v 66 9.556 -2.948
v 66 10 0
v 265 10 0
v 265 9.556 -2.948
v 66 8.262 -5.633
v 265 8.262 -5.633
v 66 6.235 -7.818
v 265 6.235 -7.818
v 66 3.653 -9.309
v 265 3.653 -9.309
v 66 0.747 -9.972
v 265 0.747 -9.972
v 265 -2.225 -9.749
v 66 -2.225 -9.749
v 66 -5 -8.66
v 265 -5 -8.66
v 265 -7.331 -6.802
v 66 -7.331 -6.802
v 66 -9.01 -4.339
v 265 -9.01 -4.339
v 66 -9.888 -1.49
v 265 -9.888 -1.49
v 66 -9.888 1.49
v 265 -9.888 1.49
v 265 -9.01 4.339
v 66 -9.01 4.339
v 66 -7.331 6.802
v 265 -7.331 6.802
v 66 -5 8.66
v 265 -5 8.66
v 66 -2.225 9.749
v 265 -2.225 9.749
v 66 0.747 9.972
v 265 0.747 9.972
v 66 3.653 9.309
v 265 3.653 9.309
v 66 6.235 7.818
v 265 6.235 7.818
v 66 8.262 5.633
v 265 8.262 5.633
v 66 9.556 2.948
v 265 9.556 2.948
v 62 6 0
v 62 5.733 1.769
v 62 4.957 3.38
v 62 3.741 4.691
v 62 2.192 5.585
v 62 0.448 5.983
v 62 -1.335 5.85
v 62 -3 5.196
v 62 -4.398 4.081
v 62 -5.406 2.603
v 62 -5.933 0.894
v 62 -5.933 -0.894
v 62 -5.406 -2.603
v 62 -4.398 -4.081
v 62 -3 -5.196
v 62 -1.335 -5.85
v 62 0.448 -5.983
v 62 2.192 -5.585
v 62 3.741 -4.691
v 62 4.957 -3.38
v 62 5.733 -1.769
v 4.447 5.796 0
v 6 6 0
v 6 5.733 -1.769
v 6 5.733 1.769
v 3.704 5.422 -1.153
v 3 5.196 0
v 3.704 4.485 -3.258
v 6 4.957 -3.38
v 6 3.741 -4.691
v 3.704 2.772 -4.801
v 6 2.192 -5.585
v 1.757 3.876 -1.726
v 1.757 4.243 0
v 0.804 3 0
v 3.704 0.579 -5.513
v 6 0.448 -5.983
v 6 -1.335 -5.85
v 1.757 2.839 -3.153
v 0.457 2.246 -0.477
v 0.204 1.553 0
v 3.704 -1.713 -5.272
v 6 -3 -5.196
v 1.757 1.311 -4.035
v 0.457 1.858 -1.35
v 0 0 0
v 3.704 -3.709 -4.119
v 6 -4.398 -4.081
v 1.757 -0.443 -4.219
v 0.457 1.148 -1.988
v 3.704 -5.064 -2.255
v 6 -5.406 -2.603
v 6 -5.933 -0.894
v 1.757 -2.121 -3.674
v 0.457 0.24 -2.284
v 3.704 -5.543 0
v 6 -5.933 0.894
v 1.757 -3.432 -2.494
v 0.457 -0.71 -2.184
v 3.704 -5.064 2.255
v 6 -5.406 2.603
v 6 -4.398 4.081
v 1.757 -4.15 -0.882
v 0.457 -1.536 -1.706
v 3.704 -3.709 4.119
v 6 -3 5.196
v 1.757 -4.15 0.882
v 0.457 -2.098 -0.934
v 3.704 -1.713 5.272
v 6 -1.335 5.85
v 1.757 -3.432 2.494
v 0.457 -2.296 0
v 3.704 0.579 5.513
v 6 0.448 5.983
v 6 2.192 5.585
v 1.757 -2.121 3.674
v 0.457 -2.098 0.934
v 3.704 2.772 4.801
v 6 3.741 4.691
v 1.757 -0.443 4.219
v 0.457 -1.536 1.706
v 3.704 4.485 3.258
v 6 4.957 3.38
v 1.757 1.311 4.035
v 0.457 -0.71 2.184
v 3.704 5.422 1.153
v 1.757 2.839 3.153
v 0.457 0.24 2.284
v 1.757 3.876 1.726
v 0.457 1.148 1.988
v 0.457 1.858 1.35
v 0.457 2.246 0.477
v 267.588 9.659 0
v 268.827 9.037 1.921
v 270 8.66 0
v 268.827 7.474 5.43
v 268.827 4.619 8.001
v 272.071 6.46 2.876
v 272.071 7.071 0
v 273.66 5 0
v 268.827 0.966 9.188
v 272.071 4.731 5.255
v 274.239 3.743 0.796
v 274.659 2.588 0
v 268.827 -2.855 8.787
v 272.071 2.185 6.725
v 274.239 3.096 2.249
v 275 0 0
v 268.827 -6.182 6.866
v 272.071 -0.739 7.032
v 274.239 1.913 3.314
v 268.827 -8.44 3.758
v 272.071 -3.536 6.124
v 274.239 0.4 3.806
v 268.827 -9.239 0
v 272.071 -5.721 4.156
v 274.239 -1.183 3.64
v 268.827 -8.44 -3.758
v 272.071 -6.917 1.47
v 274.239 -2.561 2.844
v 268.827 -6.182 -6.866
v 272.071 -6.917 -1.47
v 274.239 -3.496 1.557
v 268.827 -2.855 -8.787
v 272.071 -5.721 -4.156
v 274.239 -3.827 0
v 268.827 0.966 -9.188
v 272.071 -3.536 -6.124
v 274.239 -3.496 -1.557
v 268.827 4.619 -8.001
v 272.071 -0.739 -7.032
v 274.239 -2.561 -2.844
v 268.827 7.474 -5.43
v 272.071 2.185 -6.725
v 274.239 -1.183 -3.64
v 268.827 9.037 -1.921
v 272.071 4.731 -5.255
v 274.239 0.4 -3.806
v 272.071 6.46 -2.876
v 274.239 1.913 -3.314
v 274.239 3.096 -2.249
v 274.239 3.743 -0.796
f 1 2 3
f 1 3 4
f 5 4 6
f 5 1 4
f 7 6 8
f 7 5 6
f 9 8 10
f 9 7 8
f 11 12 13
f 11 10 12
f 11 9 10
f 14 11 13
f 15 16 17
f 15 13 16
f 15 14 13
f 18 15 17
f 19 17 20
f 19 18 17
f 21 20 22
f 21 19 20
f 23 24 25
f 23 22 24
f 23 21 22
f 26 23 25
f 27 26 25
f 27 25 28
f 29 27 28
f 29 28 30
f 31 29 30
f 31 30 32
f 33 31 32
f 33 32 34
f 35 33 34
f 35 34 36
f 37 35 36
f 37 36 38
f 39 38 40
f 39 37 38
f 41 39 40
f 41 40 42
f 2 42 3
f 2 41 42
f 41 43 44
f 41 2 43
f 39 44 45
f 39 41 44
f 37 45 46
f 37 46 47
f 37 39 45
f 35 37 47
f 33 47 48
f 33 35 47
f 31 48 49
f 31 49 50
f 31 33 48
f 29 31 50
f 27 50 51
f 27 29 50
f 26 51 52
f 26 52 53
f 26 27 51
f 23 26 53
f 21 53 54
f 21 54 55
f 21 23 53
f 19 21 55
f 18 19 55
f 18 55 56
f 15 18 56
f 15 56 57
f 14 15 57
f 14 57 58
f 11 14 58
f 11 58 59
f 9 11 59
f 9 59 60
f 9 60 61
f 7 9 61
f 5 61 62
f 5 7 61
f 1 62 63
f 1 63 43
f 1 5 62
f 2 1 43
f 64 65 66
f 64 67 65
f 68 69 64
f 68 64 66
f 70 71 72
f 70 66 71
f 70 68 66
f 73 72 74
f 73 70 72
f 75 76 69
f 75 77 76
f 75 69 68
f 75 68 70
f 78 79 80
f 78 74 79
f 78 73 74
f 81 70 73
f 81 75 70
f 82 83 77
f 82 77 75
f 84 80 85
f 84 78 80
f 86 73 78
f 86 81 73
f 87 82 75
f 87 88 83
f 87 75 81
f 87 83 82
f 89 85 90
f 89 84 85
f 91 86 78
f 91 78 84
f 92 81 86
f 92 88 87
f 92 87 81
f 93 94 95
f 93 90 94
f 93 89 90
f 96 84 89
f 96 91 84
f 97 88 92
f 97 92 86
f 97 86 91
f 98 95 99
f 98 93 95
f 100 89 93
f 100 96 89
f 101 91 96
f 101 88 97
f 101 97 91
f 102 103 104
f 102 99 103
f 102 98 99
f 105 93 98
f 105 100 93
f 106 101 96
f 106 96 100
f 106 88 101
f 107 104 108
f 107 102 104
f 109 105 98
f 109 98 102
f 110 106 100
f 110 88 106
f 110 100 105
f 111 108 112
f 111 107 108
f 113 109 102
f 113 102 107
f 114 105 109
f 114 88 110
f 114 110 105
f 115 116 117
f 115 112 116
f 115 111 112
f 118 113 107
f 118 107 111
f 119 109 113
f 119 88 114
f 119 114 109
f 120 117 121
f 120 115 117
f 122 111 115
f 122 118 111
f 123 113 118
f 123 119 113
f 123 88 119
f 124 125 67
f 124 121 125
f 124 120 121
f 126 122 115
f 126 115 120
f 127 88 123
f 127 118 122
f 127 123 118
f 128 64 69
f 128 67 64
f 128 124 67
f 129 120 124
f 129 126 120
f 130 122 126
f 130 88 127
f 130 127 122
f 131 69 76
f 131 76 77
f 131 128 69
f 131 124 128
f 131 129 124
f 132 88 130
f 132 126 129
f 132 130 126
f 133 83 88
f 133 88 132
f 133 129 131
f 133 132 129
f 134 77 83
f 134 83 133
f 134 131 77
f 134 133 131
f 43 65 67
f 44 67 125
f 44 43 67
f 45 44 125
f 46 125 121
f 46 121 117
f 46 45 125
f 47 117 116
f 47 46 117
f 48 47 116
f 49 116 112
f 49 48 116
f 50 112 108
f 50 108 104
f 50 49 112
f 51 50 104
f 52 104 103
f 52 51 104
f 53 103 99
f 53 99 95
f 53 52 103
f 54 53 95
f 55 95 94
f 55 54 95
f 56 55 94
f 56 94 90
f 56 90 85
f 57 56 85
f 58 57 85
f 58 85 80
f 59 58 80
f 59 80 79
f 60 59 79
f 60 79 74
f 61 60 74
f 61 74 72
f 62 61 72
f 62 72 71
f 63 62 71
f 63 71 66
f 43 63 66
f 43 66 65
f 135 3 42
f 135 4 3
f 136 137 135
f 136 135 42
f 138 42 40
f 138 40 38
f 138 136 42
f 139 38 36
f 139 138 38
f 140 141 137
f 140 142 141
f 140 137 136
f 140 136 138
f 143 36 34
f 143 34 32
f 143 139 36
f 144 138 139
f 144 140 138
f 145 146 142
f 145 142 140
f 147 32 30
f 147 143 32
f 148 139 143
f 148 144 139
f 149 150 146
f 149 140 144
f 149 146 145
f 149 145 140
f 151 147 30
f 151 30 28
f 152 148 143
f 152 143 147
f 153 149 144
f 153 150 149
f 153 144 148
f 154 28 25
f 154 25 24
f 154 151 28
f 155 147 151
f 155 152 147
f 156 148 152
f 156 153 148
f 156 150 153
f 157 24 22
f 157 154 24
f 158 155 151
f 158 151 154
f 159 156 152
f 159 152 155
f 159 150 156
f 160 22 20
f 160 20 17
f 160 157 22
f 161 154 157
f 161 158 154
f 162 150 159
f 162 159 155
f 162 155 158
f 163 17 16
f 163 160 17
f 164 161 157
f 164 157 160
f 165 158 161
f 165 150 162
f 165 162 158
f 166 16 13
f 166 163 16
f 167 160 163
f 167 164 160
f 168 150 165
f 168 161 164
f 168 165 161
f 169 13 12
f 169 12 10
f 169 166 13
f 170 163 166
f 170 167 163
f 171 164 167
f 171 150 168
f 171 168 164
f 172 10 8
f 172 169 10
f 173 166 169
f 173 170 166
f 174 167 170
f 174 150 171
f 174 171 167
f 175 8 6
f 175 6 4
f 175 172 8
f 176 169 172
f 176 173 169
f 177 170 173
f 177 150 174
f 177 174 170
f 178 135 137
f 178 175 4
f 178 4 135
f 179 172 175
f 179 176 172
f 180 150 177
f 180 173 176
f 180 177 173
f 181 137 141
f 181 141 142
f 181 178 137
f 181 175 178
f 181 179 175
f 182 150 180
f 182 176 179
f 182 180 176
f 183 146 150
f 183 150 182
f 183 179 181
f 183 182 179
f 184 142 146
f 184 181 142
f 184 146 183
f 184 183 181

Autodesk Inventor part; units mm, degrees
ref_plane "YZ Plane" through (0, 0, 0) normal (1, 0, 0) x (0, 1, 0)
ref_plane "XZ Plane" through (0, 0, 0) normal (0, 1, 0) x (-1, 0, 0)
ref_plane "XY Plane" through (0, 0, 0) normal (0, 0, 1) x (1, 0, 0)
sketch "Sketch1" plane through (0, 0, 0) normal (0, 0, 1) x (1, 0, 0)
  line L0 (0, 0) -> (275, 0)
  line L1 (275, 0) -> (275, 10)
  line L2 (0, 0) -> (0, 6)
  line L3 (0, 6) -> (62, 6)
  line L4 (62, 6) -> (66, 10)
  line L5 (275, 10) -> (66, 10)
  dimension "d0" = 275
  dimension "d1" = 10
  dimension "d2" = 6
  dimension "d3" = 62
  dimension "d5" = 135
revolve "Revolution1" add sketch "Sketch1" angle 360 about axis through (0, 0, 0) along (1, 0, 0)
fillet "Fillet1" [suppressed]
fillet "Fillet2" radius 10 1 edges at (275, -10, 0)
fillet "Fillet3" radius 6 1 edges at (0, -6, 0)
properties part number "Tommy Bar"
